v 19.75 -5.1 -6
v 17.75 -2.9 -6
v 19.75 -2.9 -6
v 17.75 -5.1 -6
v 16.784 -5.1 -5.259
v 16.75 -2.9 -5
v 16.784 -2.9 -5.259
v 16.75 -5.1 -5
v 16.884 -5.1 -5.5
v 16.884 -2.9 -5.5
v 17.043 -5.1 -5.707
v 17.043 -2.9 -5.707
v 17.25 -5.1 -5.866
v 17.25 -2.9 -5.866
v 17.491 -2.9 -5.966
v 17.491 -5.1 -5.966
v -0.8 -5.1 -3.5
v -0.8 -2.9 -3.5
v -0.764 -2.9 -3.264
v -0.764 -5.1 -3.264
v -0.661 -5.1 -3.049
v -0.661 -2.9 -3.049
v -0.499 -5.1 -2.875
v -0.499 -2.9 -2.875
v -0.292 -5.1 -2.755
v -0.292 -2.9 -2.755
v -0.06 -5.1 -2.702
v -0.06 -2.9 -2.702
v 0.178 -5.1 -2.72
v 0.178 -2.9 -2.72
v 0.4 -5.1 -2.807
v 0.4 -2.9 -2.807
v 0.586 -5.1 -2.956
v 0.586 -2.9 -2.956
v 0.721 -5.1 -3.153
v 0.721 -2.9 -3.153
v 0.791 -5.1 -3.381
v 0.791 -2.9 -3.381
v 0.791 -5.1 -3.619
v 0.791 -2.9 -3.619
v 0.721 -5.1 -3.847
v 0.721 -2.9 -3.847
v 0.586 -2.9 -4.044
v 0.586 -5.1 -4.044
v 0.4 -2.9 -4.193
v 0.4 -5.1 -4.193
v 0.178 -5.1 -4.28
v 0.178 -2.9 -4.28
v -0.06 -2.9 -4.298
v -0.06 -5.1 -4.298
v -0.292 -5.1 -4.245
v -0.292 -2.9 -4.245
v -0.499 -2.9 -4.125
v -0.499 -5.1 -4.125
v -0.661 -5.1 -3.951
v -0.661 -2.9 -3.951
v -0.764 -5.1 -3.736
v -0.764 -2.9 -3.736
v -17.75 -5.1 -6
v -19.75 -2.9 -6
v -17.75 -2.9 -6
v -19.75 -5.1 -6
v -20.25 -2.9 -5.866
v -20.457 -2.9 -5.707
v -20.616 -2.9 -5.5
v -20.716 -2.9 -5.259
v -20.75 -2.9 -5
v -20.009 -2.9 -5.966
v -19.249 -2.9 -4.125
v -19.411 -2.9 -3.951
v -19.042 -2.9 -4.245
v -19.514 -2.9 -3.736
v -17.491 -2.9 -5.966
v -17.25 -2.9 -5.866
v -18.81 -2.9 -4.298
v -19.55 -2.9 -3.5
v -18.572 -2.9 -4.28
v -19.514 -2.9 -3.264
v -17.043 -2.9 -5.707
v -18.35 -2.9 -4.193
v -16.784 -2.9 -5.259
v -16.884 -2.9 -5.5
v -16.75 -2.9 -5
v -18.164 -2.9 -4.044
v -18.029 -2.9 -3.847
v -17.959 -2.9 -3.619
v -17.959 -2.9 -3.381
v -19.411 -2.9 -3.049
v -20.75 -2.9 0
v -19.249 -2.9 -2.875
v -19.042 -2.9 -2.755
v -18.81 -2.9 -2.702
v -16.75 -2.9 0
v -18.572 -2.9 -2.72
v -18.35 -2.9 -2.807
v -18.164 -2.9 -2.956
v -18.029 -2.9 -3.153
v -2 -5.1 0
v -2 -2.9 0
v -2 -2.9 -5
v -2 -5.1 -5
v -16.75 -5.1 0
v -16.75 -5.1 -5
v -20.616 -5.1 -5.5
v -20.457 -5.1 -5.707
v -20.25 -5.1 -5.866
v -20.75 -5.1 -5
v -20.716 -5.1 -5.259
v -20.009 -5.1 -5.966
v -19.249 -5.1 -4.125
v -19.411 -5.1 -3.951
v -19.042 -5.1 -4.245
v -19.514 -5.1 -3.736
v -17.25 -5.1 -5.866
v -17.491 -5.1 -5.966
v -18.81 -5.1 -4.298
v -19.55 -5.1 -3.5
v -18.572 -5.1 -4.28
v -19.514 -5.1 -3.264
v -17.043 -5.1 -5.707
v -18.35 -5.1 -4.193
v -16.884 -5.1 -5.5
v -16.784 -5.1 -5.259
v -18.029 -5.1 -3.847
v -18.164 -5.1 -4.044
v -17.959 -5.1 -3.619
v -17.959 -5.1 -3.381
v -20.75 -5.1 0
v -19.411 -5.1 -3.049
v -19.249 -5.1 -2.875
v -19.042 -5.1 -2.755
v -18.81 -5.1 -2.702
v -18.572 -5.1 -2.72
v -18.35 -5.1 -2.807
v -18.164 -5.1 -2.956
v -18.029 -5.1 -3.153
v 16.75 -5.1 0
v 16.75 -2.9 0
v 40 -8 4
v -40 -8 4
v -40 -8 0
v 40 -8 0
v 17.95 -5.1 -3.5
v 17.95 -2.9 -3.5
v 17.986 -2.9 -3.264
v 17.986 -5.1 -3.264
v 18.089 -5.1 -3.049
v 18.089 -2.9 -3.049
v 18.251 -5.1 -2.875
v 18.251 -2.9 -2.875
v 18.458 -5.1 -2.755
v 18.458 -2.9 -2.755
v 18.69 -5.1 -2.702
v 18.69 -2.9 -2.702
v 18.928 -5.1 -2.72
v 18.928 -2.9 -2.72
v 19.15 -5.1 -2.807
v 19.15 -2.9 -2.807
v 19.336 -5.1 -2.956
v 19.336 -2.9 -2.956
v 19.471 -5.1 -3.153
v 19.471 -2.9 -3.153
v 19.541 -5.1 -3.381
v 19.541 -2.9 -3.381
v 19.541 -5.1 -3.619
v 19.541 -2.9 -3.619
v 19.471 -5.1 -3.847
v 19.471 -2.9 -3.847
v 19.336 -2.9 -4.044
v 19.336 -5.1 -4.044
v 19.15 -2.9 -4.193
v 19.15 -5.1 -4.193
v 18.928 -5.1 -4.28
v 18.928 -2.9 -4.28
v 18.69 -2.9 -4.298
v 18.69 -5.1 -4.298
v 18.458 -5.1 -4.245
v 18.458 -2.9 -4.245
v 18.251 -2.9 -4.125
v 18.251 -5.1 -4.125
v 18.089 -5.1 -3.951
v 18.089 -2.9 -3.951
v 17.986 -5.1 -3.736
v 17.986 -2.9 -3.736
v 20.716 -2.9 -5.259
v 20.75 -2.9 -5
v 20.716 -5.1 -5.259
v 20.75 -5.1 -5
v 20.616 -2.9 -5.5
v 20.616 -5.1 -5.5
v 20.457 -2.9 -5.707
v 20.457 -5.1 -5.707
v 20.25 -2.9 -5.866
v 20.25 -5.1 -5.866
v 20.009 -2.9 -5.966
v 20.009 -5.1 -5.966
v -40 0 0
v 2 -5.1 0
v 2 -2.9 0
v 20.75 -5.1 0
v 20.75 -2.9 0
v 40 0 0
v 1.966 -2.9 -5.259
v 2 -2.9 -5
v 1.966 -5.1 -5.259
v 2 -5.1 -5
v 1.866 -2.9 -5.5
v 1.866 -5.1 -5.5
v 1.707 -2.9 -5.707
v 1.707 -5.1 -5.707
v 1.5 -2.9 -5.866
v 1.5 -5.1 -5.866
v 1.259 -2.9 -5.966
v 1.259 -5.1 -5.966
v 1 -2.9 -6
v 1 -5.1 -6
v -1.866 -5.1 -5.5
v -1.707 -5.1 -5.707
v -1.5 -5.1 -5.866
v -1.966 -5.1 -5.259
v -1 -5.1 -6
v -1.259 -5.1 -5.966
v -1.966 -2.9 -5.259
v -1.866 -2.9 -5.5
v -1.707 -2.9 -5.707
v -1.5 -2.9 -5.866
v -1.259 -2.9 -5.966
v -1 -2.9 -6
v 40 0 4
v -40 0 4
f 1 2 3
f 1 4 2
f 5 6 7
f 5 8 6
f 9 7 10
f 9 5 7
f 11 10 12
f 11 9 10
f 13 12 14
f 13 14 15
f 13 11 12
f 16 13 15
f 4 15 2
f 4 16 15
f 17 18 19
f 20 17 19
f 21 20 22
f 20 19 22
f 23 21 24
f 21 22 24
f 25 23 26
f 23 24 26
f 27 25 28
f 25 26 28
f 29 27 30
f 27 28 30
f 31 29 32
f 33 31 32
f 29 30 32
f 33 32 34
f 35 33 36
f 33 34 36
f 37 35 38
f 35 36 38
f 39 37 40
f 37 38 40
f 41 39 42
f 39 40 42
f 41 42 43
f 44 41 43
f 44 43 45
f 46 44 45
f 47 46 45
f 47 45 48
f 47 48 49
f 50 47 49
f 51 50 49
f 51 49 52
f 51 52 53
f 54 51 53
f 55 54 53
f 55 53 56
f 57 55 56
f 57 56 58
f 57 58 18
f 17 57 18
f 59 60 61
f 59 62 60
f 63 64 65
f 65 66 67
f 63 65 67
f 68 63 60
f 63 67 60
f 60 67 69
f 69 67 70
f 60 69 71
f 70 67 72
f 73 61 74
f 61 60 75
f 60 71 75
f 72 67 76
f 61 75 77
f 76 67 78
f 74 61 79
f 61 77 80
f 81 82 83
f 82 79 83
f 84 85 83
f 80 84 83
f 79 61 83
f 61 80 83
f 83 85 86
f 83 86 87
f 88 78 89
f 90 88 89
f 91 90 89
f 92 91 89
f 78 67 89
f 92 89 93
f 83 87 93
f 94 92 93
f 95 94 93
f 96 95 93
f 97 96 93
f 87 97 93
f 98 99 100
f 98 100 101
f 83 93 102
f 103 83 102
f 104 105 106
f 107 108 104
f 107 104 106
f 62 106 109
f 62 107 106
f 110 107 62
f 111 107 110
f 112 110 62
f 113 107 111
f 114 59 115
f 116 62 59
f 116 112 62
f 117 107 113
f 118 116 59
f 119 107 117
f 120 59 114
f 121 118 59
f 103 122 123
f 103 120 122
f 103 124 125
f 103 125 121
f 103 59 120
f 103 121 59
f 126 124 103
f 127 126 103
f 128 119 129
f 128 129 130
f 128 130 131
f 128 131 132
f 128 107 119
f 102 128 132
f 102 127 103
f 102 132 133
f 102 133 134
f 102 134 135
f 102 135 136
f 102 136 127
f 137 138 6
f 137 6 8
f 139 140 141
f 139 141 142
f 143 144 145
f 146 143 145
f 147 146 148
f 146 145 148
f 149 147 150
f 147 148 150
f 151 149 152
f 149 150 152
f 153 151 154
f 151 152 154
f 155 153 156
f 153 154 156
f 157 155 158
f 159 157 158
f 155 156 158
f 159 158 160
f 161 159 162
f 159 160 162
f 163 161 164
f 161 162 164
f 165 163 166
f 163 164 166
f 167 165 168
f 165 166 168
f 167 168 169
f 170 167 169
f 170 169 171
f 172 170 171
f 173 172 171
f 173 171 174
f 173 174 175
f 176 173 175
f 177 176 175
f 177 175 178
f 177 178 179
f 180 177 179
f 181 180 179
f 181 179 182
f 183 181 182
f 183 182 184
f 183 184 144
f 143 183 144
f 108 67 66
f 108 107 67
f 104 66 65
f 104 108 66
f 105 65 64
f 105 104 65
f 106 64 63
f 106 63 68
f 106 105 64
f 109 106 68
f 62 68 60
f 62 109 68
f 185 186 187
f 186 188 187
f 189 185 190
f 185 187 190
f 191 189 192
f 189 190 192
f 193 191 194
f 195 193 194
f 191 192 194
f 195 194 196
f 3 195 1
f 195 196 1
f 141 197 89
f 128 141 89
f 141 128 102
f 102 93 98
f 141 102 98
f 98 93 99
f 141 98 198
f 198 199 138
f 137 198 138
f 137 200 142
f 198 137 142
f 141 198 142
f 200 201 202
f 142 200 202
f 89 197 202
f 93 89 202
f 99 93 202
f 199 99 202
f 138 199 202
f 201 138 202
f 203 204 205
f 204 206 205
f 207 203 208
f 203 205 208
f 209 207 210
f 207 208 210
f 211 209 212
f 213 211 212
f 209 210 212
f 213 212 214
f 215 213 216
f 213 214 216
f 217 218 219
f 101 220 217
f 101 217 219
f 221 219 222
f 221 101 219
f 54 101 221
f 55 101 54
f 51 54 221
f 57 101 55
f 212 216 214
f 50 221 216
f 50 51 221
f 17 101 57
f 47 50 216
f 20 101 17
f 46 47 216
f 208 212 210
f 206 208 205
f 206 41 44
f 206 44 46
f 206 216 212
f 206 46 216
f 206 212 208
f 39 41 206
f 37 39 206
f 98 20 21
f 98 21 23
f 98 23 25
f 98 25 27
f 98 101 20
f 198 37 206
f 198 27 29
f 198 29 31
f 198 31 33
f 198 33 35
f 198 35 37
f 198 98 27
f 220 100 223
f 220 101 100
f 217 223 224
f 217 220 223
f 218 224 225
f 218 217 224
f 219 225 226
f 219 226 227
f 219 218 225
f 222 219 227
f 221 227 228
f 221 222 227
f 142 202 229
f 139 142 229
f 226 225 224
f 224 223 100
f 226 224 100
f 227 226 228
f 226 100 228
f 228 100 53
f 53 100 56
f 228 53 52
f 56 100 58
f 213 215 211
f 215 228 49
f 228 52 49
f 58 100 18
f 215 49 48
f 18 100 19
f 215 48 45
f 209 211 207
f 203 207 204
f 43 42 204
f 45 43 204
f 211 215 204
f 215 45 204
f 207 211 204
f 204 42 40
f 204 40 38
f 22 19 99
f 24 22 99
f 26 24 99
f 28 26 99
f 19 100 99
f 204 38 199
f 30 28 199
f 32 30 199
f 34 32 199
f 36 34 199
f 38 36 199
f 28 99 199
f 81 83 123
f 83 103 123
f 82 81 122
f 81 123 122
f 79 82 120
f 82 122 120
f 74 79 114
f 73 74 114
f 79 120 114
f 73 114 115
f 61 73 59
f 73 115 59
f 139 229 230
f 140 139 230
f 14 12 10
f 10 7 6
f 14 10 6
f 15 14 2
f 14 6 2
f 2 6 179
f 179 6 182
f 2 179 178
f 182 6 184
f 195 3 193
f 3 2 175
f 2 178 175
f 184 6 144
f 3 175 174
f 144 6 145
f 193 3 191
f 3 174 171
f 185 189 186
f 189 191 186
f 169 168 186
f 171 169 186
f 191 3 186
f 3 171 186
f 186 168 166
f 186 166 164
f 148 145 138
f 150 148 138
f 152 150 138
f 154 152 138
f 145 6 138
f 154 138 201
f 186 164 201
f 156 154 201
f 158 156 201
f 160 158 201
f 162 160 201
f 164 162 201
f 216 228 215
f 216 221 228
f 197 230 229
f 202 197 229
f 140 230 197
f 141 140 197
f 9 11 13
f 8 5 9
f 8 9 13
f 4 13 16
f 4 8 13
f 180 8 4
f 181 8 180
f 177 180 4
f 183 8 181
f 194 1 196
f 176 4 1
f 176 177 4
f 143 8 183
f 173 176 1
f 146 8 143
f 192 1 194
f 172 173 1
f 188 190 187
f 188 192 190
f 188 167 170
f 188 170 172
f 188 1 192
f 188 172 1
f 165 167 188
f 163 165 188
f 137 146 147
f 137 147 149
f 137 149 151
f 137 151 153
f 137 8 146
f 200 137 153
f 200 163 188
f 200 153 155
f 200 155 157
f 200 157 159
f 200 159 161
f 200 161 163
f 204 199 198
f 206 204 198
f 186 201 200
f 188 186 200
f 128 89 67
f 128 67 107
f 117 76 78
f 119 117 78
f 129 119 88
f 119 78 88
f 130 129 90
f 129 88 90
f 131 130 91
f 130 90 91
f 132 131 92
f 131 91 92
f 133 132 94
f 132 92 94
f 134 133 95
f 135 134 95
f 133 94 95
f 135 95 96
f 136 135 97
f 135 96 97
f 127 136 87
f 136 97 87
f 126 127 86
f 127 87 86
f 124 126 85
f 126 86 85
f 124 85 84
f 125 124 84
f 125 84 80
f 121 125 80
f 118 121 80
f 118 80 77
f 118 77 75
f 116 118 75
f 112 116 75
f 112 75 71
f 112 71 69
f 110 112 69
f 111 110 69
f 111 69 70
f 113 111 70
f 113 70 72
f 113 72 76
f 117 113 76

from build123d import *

# Parameters (mm, degrees)
F1_DEPTH = 8
F2_W     = 4
F2_H     = 2.2
F3_DEPTH = 6
F4_R     = 0.8
F5_DEPTH = 5.101
F6_R     = 1


with BuildPart() as f1:
    # F0 (on Front) → F1 (new body)
    with BuildSketch(Plane.XZ):
        Polygon((-40, 4), (-40, 0), (0, 0), (40, 0), (40, 4), (0, 4), align=None)
    extrude(amount=F1_DEPTH)

    # F2 (on face) → F3 (join)
    with BuildSketch(Plane(origin=(0, 0, 0), x_dir=(1, 0, 0), z_dir=(0, 0, -1))):
        with Locations((-18.75, 4)):
            Rectangle(F2_W, F2_H)
        with Locations((18.75, 4)):
            Rectangle(F2_W, F2_H)
        with Locations((0, 4)):
            Rectangle(F2_W, F2_H)
    extrude(amount=F3_DEPTH)

    # F4 (on face) → F5 (cut, through all)
    with BuildSketch(Plane(origin=(0, -2.9, 0), x_dir=(-1, 0, 0), z_dir=(0, 1, 0))):
        with Locations((-18.75, -3.5)):
            Circle(F4_R)
        with Locations((18.75, -3.5)):
            Circle(F4_R)
        with Locations((0, -3.5)):
            Circle(F4_R)
    extrude(amount=-F5_DEPTH, mode=Mode.SUBTRACT)

    # F6
    f6_edges = [f1.edges().sort_by_distance(p)[0] for p in [
        (20.75, -4, -6),
        (16.75, -4, -6),
        (-16.75, -4, -6),
        (-20.75, -4, -6),
        (-2, -4, -6),
        (2, -4, -6),
    ]]
    fillet(f6_edges, radius=F6_R)


solid = f1.part
